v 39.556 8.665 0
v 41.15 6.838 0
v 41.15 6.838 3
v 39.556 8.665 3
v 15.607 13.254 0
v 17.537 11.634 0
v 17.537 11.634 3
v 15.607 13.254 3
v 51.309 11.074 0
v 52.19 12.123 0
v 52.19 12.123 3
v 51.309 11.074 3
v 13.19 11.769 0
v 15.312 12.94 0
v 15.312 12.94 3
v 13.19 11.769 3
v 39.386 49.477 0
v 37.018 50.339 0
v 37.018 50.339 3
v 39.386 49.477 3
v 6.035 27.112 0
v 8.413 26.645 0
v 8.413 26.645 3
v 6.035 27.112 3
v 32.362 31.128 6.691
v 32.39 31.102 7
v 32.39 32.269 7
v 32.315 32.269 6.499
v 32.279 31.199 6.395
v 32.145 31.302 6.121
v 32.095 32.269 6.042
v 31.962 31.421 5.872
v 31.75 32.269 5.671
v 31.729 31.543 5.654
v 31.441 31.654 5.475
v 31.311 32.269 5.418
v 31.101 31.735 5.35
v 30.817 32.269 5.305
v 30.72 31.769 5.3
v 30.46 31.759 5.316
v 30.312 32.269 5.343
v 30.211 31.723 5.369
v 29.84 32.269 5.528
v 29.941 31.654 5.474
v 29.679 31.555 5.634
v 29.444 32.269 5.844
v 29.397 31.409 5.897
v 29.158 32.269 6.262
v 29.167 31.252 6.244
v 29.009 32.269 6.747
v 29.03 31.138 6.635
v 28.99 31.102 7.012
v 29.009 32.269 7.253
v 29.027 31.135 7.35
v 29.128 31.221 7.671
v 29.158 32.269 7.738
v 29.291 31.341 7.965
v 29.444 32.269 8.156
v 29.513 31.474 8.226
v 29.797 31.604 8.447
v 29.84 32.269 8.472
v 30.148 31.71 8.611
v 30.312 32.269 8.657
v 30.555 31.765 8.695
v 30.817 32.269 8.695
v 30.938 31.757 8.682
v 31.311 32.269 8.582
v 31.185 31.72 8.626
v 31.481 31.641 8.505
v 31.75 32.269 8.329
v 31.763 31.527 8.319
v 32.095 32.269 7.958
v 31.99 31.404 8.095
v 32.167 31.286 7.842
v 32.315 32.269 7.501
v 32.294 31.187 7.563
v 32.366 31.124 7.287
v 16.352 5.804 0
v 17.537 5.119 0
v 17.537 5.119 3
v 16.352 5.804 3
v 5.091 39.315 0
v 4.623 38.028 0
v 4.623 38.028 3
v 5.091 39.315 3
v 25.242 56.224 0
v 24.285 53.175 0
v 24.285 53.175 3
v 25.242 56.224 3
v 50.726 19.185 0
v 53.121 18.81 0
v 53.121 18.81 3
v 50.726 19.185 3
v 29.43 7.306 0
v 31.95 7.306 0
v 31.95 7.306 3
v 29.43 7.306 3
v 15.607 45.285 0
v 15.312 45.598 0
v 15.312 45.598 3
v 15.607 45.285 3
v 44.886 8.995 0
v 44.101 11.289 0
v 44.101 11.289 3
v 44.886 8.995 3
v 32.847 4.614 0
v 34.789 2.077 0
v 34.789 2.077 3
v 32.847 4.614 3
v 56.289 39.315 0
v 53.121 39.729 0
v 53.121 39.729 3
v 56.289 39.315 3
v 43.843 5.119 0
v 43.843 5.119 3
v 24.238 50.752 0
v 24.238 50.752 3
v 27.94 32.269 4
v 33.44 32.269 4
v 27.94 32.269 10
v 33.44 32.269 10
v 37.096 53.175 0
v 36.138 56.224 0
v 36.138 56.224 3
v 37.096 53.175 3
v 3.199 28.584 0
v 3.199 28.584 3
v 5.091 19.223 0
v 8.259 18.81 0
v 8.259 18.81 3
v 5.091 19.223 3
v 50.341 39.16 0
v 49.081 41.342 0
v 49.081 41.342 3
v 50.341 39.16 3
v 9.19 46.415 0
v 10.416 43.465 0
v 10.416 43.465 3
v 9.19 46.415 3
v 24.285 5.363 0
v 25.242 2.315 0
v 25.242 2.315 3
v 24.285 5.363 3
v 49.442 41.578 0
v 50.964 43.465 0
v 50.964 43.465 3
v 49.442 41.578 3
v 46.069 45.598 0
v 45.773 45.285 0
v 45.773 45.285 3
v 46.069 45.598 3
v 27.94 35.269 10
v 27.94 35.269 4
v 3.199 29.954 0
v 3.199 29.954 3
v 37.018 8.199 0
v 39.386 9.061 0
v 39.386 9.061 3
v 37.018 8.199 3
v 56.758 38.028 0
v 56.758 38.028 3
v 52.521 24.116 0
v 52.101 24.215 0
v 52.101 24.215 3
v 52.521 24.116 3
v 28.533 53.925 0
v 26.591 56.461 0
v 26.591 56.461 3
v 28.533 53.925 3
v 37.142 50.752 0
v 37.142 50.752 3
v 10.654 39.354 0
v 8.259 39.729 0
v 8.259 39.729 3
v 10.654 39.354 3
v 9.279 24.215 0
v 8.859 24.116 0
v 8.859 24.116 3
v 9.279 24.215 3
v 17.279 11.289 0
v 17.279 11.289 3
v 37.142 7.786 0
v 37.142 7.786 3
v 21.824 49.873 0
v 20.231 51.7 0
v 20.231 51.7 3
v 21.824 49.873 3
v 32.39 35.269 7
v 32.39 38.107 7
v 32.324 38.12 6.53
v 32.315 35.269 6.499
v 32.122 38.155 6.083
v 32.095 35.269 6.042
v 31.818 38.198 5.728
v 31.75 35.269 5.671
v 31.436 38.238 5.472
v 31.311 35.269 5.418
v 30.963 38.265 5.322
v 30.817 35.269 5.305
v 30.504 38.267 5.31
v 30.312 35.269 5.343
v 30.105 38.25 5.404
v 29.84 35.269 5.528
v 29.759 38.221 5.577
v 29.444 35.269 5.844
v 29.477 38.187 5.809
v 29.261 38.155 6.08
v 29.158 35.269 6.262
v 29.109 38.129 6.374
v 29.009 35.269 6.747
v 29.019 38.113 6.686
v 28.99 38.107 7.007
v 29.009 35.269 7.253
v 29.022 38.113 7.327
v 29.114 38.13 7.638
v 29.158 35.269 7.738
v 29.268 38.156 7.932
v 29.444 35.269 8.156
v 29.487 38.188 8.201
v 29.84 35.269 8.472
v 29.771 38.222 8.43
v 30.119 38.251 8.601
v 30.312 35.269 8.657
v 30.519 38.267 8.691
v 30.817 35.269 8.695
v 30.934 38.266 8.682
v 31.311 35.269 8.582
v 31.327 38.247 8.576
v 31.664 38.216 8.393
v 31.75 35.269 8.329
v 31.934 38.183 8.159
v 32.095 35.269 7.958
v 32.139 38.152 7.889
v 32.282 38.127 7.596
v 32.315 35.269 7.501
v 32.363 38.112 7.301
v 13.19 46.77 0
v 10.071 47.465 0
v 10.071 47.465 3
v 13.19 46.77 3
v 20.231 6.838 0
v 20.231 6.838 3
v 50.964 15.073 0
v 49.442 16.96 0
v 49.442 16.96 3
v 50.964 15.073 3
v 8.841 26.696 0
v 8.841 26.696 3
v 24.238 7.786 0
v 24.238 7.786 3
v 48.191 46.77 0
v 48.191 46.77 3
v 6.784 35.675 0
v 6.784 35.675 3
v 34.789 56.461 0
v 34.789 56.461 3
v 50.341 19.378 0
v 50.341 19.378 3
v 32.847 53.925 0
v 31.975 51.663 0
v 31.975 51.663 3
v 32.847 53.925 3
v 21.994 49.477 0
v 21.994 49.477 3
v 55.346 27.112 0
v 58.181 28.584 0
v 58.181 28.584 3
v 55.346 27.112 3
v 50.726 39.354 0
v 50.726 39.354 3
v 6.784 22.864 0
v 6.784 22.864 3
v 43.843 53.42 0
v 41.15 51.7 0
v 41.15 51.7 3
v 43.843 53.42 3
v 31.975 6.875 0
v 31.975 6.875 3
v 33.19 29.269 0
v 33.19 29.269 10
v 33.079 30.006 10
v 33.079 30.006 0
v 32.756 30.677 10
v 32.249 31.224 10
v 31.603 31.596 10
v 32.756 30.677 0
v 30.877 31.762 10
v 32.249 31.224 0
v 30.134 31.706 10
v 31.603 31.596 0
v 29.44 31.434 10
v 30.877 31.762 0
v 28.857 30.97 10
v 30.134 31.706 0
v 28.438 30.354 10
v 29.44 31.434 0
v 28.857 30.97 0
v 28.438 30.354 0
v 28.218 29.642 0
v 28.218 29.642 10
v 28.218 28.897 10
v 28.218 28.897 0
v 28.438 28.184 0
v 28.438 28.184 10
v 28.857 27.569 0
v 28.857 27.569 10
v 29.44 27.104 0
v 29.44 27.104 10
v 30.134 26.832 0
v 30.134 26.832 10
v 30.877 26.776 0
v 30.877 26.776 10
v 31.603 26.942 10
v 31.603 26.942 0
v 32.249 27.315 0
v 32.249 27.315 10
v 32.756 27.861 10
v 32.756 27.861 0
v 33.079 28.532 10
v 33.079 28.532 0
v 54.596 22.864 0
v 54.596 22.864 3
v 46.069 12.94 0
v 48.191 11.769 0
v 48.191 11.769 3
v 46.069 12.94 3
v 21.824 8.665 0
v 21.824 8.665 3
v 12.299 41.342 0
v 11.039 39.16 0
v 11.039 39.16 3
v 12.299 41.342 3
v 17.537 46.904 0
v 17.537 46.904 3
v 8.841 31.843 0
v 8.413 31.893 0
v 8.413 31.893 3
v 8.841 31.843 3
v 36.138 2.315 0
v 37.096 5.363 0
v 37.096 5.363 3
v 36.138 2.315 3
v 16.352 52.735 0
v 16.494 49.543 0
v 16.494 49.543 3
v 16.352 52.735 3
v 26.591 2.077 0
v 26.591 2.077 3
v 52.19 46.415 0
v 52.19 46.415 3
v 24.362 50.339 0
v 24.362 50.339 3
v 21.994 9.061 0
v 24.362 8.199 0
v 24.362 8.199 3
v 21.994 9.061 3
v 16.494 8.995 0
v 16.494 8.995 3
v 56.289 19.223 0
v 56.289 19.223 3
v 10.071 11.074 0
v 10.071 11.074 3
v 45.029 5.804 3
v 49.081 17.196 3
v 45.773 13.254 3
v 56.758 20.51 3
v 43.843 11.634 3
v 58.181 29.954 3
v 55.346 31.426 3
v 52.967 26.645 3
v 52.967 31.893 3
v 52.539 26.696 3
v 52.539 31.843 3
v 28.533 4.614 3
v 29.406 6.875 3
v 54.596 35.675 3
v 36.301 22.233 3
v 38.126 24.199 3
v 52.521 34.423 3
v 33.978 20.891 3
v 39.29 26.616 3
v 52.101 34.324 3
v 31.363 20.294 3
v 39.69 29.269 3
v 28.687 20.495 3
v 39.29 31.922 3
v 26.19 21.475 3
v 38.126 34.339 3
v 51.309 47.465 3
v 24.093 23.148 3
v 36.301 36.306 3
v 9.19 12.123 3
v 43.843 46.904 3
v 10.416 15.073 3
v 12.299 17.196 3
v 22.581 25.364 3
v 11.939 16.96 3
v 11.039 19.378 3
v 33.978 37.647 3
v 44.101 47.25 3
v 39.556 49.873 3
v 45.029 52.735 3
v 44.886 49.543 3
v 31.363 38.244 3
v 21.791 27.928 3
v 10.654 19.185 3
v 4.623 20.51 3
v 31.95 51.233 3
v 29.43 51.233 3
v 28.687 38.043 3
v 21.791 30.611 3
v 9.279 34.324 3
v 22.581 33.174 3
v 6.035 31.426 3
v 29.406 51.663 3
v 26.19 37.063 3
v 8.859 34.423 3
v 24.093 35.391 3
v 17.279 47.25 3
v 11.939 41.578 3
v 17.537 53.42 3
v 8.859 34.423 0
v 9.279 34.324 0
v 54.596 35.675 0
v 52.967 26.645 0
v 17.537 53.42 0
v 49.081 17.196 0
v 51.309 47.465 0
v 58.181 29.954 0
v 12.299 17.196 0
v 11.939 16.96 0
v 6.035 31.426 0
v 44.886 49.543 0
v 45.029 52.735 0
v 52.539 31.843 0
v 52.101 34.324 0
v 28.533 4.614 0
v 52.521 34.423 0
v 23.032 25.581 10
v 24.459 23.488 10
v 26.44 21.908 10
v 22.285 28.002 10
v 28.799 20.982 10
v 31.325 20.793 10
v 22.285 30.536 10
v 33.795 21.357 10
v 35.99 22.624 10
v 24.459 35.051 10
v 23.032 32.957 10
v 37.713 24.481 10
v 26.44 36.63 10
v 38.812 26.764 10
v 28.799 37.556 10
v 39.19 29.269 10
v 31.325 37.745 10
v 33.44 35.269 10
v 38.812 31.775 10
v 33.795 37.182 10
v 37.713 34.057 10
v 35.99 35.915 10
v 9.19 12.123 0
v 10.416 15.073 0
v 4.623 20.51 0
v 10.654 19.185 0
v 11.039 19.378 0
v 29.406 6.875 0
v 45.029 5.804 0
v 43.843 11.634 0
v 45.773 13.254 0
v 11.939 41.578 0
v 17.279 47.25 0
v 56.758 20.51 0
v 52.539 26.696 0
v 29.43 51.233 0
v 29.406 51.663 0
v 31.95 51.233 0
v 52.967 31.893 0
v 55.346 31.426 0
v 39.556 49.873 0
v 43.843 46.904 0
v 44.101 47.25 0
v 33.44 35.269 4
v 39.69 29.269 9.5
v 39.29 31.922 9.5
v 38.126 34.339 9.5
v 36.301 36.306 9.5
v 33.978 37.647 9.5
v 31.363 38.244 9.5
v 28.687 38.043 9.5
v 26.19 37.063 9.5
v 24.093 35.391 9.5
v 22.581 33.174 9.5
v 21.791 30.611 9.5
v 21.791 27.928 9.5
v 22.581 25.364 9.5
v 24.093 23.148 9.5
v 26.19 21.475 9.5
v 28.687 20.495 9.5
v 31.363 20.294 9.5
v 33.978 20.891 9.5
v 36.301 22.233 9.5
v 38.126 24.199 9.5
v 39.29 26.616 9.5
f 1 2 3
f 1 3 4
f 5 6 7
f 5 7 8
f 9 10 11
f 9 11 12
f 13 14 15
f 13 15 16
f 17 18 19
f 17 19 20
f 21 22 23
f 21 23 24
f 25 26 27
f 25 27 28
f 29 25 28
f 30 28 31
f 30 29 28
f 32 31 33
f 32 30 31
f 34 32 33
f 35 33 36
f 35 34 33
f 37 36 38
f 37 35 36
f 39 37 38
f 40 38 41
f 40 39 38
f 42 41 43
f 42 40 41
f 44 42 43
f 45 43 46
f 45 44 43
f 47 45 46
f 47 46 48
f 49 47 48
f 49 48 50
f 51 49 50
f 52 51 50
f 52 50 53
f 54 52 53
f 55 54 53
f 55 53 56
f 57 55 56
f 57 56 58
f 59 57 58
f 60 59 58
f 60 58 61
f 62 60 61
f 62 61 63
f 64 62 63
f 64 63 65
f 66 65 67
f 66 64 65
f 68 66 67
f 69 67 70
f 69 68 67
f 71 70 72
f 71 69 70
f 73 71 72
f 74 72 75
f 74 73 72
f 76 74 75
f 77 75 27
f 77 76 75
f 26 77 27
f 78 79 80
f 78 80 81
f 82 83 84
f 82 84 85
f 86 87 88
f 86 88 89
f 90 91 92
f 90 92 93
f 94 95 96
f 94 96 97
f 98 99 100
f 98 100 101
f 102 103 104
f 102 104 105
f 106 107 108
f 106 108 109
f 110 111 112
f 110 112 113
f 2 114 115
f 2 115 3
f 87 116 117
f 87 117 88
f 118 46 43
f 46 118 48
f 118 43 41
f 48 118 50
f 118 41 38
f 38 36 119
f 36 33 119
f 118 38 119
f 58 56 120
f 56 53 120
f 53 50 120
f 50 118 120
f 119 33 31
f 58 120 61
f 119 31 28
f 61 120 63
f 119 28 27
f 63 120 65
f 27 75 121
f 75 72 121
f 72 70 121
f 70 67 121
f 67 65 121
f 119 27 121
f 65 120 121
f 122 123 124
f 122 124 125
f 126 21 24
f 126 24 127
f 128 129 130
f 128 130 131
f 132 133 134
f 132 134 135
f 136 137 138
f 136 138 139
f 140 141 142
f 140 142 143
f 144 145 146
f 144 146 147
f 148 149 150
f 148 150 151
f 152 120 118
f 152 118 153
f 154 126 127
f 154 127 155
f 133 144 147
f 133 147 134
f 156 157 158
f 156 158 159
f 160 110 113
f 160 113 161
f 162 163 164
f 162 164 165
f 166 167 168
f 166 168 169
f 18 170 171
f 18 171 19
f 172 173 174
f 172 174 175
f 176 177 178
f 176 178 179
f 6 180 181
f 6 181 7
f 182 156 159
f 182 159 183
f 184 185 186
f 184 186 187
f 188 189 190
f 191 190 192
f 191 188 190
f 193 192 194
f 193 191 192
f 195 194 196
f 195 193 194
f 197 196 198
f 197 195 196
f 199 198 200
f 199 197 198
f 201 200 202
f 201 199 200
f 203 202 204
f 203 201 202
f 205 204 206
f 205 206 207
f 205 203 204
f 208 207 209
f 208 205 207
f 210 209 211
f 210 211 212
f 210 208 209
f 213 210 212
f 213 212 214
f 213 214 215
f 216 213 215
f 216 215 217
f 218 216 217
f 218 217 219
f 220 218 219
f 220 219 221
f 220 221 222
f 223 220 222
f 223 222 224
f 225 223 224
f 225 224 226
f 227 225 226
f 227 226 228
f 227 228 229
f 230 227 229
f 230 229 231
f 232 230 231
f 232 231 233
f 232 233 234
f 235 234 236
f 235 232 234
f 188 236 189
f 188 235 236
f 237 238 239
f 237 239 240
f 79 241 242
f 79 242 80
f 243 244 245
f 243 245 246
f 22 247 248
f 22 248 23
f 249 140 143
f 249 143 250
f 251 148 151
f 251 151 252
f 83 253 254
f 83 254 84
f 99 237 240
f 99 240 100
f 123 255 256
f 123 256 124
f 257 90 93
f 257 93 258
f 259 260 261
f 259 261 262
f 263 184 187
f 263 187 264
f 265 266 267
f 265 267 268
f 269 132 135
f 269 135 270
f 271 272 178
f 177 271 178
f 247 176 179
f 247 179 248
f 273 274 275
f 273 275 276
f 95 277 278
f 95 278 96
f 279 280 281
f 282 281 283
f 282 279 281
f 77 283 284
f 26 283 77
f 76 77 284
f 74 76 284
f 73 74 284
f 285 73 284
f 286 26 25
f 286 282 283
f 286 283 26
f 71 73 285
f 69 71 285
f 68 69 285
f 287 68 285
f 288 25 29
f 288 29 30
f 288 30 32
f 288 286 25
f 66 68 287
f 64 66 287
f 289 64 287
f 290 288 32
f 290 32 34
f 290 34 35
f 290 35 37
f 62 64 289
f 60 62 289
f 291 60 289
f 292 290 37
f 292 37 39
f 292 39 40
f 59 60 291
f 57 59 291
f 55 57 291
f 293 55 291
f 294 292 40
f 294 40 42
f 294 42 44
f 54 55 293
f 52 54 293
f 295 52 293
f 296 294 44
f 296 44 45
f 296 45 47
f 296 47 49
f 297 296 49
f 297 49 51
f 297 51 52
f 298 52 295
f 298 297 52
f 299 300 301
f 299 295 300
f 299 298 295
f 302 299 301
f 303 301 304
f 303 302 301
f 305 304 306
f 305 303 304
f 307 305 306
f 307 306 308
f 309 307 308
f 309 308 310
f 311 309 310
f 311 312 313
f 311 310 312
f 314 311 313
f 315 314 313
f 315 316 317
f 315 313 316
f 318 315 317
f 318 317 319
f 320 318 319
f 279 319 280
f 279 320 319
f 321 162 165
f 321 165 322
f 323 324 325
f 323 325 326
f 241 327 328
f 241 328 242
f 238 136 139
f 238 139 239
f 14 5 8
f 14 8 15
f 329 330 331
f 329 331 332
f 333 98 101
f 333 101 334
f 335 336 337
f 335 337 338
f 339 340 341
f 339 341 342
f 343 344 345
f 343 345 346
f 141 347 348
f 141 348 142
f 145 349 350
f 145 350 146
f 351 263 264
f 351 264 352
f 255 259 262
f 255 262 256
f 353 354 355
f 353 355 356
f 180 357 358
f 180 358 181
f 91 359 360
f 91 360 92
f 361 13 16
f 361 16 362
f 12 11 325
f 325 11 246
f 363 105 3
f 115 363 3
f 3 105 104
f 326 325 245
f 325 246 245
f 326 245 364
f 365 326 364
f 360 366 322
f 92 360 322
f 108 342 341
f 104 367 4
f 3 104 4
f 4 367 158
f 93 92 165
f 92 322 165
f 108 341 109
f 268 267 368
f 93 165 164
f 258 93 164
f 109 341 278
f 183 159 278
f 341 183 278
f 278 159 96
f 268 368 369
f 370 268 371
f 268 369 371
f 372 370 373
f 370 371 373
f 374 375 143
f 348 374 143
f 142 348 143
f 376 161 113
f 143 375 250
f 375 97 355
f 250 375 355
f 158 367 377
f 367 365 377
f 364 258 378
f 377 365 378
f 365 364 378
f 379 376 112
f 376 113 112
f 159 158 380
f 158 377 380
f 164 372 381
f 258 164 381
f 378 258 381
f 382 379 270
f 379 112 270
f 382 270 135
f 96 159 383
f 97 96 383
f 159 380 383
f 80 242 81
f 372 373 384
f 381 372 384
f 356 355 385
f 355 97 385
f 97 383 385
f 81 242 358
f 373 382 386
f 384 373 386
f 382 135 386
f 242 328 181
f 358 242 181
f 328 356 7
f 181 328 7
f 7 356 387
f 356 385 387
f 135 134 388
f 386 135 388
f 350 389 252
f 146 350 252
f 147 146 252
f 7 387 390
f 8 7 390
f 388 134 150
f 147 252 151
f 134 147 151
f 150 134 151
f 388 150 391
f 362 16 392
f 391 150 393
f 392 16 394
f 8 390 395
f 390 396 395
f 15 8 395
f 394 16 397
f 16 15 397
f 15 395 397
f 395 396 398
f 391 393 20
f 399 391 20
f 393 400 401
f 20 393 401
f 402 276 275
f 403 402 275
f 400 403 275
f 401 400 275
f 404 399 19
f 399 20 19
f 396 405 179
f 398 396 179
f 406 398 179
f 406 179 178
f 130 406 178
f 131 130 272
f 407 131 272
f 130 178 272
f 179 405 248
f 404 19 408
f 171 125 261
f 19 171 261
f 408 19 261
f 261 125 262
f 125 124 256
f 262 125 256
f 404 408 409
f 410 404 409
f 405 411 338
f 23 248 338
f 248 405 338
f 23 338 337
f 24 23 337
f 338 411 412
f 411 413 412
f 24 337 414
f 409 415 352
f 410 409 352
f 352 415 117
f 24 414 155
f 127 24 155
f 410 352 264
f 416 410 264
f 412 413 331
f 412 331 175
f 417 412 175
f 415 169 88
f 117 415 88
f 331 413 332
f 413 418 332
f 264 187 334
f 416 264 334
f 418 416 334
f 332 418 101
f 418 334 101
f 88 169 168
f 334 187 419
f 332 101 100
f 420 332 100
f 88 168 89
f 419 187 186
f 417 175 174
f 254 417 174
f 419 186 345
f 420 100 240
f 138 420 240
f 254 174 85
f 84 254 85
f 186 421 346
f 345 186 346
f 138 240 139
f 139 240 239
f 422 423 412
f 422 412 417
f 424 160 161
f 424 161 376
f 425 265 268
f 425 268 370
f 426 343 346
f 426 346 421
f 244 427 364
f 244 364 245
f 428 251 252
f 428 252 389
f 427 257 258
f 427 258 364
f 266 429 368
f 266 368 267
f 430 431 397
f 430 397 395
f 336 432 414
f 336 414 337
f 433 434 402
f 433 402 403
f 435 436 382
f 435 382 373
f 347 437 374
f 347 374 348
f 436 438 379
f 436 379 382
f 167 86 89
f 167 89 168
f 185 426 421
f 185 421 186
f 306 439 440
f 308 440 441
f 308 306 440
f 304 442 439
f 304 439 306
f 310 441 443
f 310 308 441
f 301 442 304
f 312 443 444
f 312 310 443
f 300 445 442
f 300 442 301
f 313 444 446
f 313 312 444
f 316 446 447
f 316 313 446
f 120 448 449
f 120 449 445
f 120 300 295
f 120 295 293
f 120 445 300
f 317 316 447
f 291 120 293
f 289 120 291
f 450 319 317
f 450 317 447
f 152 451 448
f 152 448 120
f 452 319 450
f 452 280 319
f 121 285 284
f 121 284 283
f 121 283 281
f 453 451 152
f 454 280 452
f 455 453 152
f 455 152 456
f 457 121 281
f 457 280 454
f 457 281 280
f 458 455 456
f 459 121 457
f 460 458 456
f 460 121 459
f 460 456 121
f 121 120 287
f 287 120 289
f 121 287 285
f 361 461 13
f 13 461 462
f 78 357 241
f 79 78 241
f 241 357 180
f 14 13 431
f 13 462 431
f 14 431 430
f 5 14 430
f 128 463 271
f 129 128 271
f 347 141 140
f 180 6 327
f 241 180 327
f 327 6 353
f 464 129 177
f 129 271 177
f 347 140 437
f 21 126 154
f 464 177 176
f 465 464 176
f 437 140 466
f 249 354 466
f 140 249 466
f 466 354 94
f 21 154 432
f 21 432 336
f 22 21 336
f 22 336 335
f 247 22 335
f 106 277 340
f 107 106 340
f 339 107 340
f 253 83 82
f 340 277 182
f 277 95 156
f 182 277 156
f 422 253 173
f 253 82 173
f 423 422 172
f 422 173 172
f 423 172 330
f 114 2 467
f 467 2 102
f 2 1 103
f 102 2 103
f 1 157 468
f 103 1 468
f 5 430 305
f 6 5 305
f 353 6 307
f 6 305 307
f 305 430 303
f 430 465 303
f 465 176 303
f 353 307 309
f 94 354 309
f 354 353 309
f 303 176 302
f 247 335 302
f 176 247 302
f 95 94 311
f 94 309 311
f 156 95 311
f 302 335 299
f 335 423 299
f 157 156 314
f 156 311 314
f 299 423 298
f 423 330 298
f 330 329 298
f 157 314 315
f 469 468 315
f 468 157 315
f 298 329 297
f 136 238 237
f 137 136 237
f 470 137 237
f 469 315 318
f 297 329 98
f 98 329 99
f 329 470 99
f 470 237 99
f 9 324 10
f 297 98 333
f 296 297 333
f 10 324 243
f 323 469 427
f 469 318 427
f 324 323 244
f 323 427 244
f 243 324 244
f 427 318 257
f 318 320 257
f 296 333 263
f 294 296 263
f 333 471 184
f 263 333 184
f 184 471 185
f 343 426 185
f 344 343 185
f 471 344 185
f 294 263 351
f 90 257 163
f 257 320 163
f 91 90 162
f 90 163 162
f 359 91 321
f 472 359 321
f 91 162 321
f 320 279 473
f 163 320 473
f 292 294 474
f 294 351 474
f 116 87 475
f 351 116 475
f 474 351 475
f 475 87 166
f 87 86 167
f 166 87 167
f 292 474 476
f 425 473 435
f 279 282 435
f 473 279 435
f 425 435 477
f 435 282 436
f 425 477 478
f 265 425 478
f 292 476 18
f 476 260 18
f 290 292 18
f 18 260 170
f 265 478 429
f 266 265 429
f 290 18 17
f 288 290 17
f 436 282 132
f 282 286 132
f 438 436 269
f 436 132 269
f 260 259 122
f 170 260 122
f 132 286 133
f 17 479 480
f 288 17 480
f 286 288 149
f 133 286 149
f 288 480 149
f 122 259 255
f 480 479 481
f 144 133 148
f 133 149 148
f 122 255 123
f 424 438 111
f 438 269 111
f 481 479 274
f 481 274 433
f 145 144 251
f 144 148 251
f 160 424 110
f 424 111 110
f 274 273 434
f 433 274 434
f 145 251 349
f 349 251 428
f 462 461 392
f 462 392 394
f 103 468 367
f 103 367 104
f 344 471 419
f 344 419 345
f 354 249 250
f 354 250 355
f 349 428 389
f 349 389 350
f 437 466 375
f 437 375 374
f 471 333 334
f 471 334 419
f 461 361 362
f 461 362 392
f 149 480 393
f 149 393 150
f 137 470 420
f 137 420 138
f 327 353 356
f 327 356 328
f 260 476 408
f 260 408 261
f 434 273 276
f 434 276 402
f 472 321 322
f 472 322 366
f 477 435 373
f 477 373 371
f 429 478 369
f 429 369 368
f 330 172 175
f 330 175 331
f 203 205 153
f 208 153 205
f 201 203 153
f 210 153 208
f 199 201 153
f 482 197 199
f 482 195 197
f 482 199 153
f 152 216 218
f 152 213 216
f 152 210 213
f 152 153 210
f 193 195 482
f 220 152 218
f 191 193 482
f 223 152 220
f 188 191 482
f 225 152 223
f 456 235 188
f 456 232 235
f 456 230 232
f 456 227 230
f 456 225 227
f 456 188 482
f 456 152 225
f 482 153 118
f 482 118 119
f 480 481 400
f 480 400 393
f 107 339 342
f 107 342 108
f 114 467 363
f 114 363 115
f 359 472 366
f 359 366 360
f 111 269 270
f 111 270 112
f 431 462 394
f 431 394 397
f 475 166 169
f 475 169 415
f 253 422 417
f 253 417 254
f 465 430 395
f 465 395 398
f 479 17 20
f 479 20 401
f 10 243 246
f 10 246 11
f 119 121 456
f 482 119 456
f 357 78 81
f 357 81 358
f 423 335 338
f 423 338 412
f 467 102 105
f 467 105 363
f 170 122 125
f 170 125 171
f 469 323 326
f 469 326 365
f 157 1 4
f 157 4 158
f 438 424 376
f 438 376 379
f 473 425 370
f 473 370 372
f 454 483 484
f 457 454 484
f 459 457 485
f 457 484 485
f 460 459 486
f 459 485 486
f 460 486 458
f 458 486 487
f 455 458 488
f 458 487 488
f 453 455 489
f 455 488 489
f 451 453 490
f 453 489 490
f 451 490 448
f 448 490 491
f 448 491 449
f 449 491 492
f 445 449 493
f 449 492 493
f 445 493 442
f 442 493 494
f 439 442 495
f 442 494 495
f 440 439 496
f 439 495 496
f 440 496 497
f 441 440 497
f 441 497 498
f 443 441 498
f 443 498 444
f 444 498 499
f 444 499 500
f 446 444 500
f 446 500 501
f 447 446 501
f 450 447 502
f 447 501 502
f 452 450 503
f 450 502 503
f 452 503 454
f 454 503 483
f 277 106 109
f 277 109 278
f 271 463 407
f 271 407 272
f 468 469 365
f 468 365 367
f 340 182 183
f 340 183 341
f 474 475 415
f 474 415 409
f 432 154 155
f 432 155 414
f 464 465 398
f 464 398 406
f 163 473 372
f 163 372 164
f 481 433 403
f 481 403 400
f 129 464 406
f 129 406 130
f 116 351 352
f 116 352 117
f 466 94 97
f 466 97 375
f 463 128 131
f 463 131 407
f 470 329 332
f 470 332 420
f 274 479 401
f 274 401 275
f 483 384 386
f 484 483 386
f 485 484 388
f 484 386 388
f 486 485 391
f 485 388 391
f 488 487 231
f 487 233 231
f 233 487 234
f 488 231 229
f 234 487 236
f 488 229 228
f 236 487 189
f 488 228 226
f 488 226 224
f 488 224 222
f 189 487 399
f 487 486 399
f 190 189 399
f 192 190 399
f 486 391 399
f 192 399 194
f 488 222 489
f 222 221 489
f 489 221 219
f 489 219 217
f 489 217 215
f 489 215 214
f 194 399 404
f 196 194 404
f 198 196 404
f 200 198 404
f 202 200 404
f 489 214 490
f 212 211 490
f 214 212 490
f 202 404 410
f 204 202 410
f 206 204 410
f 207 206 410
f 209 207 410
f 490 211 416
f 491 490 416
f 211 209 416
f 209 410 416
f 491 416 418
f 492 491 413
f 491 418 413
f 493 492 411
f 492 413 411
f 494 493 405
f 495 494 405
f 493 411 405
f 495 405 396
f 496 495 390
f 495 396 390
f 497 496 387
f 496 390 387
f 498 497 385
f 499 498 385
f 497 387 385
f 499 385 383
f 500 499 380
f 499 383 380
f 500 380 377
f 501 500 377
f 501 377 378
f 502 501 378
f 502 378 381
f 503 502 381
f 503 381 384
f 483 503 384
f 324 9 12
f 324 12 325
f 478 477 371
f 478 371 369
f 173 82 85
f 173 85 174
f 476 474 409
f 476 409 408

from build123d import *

# Parameters (mm, degrees)
BOSS_EXTRUDE1_DEPTH = 3
SKETCH2_R           = 9
BOSS_EXTRUDE2_DEPTH = 10
SKETCH3_R           = 2.5
CUT_EXTRUDE1_DEPTH  = 11
SKETCH4_R           = 1.7
CUT_EXTRUDE2_DEPTH  = 28.192254919
SKETCH6_W           = 5.5
SKETCH6_H           = 3
CUT_EXTRUDE3_DEPTH  = 6
CHAMFER1_SIZE       = 0.5


with BuildPart() as part:
    # Sketch1 → Boss-Extrude1 (new body)
    with BuildSketch(Plane.XY):
        Polygon((52.538753323, 31.842550454), (52.966828578, 31.892874255), (55.345645602, 31.426138186), (58.181047917, 29.953793943), (58.181047917, 28.58447352), (55.345645602, 27.112129278), (52.966828578, 26.645393209), (52.538753323, 26.695717009), (52.101175487, 24.214740941), (52.520827219, 24.115605549), (54.596406573, 22.863561667), (56.757515266, 20.510014449), (56.289051942, 19.223198182), (53.120822867, 18.809593755), (50.726022805, 19.184537369), (50.340928413, 19.378272292), (49.081325783, 17.196429655), (49.441582758, 16.959930445), (50.963818413, 15.073334341), (52.189727713, 12.122814362), (51.309387982, 11.073577892), (48.190619463, 11.768605458), (46.068603205, 12.939871673), (45.772925049, 13.253692509), (43.84291646, 11.634265293), (44.100798578, 11.288694958), (44.885889814, 8.995405743), (45.028653503, 5.803634881), (43.842700649, 5.118758859), (41.149630401, 6.838401289), (39.556121189, 8.664954435), (39.385711475, 9.061064382), (37.018340862, 8.199298953), (37.142314438, 7.786342725), (37.095662488, 5.362817582), (36.138217708, 2.31467442), (34.789414653, 2.076878813), (32.847095643, 4.613578553), (31.974531237, 6.875118271), (31.949693054, 7.30556898), (29.430487794, 7.30556898), (29.405650376, 6.875118271), (28.53308597, 4.613578553), (26.59076696, 2.076878813), (25.241963905, 2.31467442), (24.284519124, 5.362817582), (24.237867175, 7.786342725), (24.361839986, 8.199298953), (21.994469372, 9.061064382), (21.824060424, 8.664954435), (20.230551212, 6.838401289), (17.537480964, 5.118758859), (16.351527344, 5.803634881), (16.494291033, 8.995405743), (17.279383034, 11.288694958), (17.537264388, 11.634265293), (15.607256564, 13.253692509), (15.311577642, 12.939871673), (13.18956215, 11.768605458), (10.070792865, 11.073577892), (9.190453134, 12.122814362), (10.4163632, 15.073334341), (11.938598855, 16.959930445), (12.29885583, 17.196429655), (11.0392532, 19.378272292), (10.654158042, 19.184537369), (8.259357981, 18.809593755), (5.091129671, 19.223198182), (4.622666347, 20.510014449), (6.783774274, 22.863561667), (8.859354394, 24.115605549), (9.279006126, 24.214740941), (8.841427525, 26.695717009), (8.413353035, 26.645393209), (6.034535245, 27.112129278), (3.199133696, 28.58447352), (3.199133696, 29.953793943), (6.034535245, 31.426138186), (8.413353035, 31.892874255), (8.841427525, 31.842550454), (9.279006126, 34.323526523), (8.859354394, 34.422661915), (6.783774274, 35.674705796), (4.622666347, 38.028253015), (5.091129671, 39.315069282), (8.259357981, 39.728673709), (10.654158042, 39.353730095), (11.0392532, 39.159995172), (12.29885583, 41.341837809), (11.938598855, 41.578337019), (10.4163632, 43.464933122), (9.190453134, 46.415453101), (10.070792865, 47.464689572), (13.18956215, 46.769662005), (15.311577642, 45.598395791), (15.607256564, 45.284574954), (17.537264388, 46.904002171), (17.279383034, 47.249572505), (16.494291033, 49.542861721), (16.351527344, 52.734632582), (17.537480964, 53.419508605), (20.230551212, 51.699866175), (21.824060424, 49.873313028), (21.994469372, 49.477203082), (24.361839986, 50.338968511), (24.237867175, 50.751924739), (24.284519124, 53.175449881), (25.241963905, 56.223593043), (26.59076696, 56.461388651), (28.53308597, 53.92468891), (29.405650376, 51.663149193), (29.430487794, 51.232698484), (31.949693054, 51.232698484), (31.974531237, 51.663149193), (32.847095643, 53.92468891), (34.789414653, 56.461388651), (36.138217708, 56.223593043), (37.095662488, 53.175449881), (37.142314438, 50.751924739), (37.018340862, 50.338968511), (39.385711475, 49.477203082), (39.556121189, 49.873313028), (41.149630401, 51.699866175), (43.842700649, 53.419508605), (45.028653503, 52.734632582), (44.885889814, 49.542861721), (44.100798578, 47.249572505), (43.84291646, 46.904002171), (45.772925049, 45.284574954), (46.068603205, 45.598395791), (48.190619463, 46.769662005), (51.309387982, 47.464689572), (52.189727713, 46.415453101), (50.963818413, 43.464933122), (49.441582758, 41.578337019), (49.081325783, 41.341837809), (50.340928413, 39.159995172), (50.726022805, 39.353730095), (53.120822867, 39.728673709), (56.289051942, 39.315069282), (56.757515266, 38.028253015), (54.596406573, 35.674705796), (52.520827219, 34.422661915), (52.101175487, 34.323526523), align=None)
    extrude(amount=BOSS_EXTRUDE1_DEPTH)

    # Sketch2 → Boss-Extrude2 (add)
    with BuildSketch(Plane.XY):
        with Locations((30.690090806, 29.269133732)):
            Circle(SKETCH2_R)
    extrude(amount=BOSS_EXTRUDE2_DEPTH)

    # Sketch3 → Cut-Extrude1 (cut, through all)
    with BuildSketch(Plane.XY):
        with Locations((30.690090424, 29.269133732)):
            Circle(SKETCH3_R)
    extrude(amount=CUT_EXTRUDE1_DEPTH, mode=Mode.SUBTRACT)

    # Sketch4 → Cut-Extrude2 (cut, through all)
    with BuildSketch(Plane(origin=(0, 29.269133732, 0), x_dir=(1, 0, 0), z_dir=(0, 1, 0))):
        with Locations((30.690090424, -7)):
            Circle(SKETCH4_R)
    extrude(amount=CUT_EXTRUDE2_DEPTH, mode=Mode.SUBTRACT)

    # Sketch6 → Cut-Extrude3 (cut)
    with BuildSketch(Plane.XY.offset(10)):
        with Locations((30.690090806, 33.769133732)):
            Rectangle(SKETCH6_W, SKETCH6_H)
    extrude(amount=-CUT_EXTRUDE3_DEPTH, mode=Mode.SUBTRACT)

    # Chamfer1
    chamfer1_edges = [part.edges().sort_by_distance(p)[0] for p in [
        (21.690090806, 29.269133732, 10),
    ]]
    chamfer(chamfer1_edges, length=CHAMFER1_SIZE)


solid = part.part
